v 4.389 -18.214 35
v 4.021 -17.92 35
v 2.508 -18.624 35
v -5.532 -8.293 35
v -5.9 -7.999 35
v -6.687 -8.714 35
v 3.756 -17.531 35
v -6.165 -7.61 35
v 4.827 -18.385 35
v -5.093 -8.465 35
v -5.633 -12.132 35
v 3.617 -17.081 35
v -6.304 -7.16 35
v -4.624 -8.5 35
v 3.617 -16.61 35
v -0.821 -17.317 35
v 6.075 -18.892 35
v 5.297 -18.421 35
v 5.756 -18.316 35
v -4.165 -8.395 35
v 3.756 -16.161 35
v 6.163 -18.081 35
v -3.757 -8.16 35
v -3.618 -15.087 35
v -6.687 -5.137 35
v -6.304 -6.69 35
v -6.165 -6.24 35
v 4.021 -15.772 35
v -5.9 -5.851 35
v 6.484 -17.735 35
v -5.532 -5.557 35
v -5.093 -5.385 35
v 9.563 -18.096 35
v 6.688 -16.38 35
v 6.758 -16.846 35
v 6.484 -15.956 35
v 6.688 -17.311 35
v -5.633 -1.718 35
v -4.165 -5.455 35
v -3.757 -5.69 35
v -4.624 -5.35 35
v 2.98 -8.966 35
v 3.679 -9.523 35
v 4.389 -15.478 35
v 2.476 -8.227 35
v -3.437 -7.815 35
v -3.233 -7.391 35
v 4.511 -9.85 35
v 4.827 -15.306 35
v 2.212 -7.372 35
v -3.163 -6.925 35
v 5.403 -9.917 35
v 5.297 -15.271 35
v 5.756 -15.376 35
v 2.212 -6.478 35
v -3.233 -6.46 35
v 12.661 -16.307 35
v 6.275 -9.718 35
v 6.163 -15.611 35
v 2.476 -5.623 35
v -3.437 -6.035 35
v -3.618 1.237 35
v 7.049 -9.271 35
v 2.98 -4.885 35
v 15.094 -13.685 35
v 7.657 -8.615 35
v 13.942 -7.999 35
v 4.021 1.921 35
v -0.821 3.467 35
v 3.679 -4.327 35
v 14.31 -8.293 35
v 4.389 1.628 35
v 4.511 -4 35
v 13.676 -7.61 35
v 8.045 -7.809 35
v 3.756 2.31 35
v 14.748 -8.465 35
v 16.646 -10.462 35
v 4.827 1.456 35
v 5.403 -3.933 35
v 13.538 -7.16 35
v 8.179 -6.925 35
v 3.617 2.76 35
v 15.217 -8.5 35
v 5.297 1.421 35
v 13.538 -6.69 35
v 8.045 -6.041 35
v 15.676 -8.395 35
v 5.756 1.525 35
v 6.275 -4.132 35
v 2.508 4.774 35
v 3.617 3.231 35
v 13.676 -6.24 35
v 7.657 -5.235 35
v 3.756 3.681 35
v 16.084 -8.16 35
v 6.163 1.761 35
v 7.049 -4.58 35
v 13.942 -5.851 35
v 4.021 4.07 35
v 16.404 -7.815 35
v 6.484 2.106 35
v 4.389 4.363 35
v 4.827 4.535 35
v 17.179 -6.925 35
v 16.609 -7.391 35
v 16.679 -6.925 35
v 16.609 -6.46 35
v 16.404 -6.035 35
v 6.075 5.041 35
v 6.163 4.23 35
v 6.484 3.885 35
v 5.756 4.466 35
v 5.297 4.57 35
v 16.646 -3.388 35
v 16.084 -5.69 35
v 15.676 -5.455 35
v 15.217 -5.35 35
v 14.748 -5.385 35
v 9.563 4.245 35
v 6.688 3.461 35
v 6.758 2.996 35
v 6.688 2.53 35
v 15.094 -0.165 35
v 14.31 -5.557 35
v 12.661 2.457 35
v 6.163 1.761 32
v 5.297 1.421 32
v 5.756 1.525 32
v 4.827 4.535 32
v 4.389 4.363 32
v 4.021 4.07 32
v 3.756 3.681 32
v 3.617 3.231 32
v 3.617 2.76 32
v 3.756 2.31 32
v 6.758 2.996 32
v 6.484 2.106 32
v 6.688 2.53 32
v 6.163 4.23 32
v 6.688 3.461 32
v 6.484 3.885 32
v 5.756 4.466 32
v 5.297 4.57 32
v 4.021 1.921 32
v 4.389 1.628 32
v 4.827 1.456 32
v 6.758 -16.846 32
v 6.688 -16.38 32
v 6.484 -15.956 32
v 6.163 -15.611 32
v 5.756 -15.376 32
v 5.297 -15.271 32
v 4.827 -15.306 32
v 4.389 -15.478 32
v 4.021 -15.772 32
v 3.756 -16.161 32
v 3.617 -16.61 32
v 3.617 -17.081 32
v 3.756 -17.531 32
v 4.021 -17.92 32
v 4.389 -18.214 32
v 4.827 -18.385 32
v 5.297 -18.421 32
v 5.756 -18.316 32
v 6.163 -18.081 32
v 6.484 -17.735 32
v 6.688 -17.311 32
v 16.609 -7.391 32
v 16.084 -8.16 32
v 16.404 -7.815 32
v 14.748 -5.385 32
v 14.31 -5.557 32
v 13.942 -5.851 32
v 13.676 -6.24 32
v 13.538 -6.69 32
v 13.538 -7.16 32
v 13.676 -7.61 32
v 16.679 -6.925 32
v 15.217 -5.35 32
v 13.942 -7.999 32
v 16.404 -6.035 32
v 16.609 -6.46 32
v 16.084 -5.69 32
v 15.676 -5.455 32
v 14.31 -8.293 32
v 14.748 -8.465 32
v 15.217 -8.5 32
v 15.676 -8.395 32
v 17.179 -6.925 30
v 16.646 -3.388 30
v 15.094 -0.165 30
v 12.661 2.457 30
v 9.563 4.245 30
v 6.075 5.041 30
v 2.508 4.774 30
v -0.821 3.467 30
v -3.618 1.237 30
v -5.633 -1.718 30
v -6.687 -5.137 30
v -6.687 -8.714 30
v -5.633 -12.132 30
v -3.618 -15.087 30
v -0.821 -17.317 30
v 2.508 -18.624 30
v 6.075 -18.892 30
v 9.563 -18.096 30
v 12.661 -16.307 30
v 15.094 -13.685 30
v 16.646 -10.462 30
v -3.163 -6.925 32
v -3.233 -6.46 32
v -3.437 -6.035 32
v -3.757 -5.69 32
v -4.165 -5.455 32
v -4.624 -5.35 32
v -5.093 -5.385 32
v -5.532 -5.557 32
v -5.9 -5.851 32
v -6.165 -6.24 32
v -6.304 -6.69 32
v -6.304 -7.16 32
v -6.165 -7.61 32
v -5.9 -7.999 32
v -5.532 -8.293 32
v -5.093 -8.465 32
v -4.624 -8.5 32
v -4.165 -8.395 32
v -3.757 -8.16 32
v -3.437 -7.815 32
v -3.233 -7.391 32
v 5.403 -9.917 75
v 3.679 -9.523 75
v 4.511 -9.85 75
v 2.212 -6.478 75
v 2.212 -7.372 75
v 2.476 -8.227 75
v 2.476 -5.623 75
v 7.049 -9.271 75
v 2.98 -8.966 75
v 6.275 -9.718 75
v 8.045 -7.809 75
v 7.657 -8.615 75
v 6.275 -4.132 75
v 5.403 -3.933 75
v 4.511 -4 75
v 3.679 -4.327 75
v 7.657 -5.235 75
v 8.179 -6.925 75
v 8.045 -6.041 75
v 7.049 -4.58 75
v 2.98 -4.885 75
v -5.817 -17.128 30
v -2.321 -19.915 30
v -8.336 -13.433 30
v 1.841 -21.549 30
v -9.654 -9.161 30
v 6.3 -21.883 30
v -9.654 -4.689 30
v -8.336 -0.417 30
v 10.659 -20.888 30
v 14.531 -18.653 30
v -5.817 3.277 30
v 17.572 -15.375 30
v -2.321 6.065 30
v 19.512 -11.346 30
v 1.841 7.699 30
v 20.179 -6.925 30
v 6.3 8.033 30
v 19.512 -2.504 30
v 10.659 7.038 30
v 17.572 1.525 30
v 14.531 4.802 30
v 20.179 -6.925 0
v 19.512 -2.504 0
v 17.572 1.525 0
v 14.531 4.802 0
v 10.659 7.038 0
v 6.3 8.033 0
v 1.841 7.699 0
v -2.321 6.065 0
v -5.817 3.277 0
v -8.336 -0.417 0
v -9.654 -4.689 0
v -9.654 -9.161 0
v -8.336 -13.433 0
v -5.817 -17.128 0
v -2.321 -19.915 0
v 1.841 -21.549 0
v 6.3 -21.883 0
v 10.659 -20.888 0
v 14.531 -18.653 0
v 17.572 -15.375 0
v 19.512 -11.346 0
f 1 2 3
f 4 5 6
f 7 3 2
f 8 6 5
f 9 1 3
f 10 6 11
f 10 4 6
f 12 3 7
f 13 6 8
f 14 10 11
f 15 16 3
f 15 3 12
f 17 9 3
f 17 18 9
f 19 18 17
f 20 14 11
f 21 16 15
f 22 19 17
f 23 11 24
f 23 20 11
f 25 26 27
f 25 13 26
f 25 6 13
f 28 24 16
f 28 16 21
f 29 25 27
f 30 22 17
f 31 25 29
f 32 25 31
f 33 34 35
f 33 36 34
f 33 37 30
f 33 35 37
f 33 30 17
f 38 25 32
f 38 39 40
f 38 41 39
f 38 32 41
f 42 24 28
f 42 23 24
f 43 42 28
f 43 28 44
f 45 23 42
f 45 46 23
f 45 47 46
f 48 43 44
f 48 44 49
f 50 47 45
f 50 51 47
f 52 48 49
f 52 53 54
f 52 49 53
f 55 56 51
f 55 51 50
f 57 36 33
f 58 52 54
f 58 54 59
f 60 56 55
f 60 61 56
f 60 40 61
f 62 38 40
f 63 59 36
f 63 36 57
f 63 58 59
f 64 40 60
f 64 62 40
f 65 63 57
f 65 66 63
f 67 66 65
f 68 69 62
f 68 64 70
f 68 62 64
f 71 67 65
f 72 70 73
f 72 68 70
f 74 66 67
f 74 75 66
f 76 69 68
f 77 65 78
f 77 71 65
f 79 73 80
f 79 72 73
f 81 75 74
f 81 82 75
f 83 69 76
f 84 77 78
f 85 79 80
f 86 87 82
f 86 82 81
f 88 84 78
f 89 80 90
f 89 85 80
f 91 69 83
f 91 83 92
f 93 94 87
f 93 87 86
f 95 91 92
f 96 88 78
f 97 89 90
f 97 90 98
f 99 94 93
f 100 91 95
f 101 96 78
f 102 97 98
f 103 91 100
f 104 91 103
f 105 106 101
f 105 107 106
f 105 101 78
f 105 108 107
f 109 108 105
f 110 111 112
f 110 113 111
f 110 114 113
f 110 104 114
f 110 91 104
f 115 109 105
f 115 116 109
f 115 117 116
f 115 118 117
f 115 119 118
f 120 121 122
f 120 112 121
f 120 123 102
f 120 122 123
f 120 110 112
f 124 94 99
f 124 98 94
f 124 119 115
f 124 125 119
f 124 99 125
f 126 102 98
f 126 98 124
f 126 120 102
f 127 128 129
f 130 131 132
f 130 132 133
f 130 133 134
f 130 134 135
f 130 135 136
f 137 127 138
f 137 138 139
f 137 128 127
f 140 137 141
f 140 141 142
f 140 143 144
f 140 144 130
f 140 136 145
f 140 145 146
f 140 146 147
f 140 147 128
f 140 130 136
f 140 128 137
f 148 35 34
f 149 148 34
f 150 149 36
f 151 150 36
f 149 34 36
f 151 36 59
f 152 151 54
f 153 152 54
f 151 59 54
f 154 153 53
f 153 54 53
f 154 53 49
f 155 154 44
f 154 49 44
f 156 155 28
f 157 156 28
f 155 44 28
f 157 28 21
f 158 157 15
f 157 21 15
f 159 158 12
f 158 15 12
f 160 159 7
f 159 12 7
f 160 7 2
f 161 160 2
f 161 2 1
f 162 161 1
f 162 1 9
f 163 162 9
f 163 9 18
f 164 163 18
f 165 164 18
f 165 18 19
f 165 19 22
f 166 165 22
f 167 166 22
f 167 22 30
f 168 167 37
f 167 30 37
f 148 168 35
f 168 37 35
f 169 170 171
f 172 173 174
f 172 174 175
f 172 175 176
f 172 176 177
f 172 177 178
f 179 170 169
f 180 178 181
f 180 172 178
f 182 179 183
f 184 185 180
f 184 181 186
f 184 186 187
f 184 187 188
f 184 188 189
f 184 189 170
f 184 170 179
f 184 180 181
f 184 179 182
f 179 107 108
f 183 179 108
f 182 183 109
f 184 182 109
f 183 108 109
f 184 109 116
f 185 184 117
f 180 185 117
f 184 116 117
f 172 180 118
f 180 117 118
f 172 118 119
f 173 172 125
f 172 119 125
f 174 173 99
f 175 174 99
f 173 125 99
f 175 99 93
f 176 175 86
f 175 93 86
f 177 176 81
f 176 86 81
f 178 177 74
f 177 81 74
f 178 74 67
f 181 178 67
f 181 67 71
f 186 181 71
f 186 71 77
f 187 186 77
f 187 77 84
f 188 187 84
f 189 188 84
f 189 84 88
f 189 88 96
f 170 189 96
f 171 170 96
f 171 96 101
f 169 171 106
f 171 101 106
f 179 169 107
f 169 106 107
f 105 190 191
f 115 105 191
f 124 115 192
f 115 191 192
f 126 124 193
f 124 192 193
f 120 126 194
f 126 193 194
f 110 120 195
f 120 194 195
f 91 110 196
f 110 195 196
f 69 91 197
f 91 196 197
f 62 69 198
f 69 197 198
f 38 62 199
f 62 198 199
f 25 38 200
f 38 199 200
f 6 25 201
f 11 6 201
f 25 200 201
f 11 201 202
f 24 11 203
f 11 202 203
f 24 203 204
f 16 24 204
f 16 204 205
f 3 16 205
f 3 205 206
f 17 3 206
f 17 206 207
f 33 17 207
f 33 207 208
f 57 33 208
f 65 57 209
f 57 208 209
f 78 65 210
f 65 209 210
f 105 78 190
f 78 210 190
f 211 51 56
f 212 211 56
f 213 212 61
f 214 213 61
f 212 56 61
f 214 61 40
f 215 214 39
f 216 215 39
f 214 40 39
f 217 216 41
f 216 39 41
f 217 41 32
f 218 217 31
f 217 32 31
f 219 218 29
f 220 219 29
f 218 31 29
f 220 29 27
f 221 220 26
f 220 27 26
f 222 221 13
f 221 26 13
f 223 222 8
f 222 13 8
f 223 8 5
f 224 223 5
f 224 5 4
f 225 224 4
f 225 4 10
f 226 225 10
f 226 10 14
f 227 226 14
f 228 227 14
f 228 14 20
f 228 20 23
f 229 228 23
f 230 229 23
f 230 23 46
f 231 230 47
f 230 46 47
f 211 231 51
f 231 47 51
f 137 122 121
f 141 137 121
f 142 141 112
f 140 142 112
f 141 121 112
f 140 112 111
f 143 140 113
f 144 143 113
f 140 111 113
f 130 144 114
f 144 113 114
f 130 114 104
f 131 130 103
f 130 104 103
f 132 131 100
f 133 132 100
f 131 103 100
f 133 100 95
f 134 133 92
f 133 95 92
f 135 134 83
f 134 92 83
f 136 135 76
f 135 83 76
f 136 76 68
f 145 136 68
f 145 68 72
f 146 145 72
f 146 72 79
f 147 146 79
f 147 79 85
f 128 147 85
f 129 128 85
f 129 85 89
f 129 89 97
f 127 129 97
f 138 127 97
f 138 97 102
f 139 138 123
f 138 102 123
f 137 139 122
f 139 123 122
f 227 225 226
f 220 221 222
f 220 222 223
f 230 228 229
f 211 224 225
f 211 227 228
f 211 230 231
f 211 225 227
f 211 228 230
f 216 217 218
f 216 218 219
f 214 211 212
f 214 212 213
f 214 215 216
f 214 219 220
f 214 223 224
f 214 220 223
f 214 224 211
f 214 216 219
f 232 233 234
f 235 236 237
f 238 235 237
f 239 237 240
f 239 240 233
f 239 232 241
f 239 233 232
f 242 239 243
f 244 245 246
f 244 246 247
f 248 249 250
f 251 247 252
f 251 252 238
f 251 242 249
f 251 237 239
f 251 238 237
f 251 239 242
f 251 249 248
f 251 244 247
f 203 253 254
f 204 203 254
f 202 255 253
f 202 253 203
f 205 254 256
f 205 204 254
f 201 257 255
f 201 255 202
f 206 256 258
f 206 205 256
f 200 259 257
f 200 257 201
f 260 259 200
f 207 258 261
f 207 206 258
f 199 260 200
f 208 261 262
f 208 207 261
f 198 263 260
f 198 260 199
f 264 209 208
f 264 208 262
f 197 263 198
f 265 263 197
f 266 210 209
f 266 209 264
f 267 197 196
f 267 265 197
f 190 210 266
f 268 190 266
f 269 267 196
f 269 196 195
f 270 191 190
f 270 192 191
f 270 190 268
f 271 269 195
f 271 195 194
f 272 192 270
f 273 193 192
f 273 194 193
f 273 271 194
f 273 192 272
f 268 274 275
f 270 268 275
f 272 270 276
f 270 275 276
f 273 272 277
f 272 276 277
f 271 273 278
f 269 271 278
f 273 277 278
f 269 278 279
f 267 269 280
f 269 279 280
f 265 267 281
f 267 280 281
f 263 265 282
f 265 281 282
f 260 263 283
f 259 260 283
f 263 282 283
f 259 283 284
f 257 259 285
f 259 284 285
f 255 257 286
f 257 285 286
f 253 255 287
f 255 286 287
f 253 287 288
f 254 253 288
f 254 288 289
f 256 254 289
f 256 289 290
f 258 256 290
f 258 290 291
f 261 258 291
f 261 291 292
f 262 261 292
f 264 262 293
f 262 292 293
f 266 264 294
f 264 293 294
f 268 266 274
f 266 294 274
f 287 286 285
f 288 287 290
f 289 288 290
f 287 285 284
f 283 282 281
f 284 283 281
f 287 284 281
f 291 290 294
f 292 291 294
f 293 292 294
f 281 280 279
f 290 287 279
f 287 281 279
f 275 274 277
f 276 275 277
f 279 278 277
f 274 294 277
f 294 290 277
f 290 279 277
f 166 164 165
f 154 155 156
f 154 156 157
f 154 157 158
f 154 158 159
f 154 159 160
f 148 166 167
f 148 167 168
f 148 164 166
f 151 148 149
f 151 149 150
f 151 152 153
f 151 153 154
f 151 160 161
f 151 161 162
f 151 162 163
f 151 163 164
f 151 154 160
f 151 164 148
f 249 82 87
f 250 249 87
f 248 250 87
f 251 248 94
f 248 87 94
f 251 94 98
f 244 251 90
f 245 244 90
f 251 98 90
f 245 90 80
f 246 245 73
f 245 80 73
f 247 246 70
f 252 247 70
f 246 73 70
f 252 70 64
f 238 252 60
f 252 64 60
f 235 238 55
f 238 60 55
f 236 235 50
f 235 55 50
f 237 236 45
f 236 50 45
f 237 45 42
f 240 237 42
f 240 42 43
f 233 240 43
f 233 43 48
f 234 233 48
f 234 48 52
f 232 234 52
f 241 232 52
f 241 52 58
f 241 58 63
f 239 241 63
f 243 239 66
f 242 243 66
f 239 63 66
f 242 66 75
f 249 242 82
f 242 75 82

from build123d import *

# Parameters (mm, degrees)
SKETCH1_R           = 15
BOSS_EXTRUDE1_DEPTH = 30
SKETCH2_R           = 12
BOSS_EXTRUDE2_DEPTH = 5
SKETCH4_R           = 1.579295677
CUT_EXTRUDE3_DEPTH  = 3
SKETCH5_R           = 3
BOSS_EXTRUDE3_DEPTH = 40


with BuildPart() as part:
    # Sketch1 → Boss-Extrude1 (new body)
    with BuildSketch(Plane.XY):
        with Locations((5.178689325, -6.92509434)):
            Circle(SKETCH1_R)
    extrude(amount=BOSS_EXTRUDE1_DEPTH)

    # Sketch2 → Boss-Extrude2 (add)
    with BuildSketch(Plane.XY.offset(30)):
        with Locations((5.178689325, -6.92509434)):
            Circle(SKETCH2_R)
    extrude(amount=BOSS_EXTRUDE2_DEPTH)

    # Sketch4 → Cut-Extrude3 (cut)
    with BuildSketch(Plane.XY.offset(35)):
        with Locations((5.178689325, 2.995609984)):
            Circle(SKETCH4_R)
        with Locations((15.099393648, -6.92509434)):
            Circle(SKETCH4_R)
        with Locations((5.178689325, -16.845798663)):
            Circle(SKETCH4_R)
        with Locations((-4.742014998, -6.92509434)):
            Circle(SKETCH4_R)
    extrude(amount=-CUT_EXTRUDE3_DEPTH, mode=Mode.SUBTRACT)

    # Sketch5 → Boss-Extrude3 (add)
    with BuildSketch(Plane.XY.offset(35)):
        with Locations((5.178689325, -6.92509434)):
            Circle(SKETCH5_R)
    extrude(amount=BOSS_EXTRUDE3_DEPTH)


solid = part.part
